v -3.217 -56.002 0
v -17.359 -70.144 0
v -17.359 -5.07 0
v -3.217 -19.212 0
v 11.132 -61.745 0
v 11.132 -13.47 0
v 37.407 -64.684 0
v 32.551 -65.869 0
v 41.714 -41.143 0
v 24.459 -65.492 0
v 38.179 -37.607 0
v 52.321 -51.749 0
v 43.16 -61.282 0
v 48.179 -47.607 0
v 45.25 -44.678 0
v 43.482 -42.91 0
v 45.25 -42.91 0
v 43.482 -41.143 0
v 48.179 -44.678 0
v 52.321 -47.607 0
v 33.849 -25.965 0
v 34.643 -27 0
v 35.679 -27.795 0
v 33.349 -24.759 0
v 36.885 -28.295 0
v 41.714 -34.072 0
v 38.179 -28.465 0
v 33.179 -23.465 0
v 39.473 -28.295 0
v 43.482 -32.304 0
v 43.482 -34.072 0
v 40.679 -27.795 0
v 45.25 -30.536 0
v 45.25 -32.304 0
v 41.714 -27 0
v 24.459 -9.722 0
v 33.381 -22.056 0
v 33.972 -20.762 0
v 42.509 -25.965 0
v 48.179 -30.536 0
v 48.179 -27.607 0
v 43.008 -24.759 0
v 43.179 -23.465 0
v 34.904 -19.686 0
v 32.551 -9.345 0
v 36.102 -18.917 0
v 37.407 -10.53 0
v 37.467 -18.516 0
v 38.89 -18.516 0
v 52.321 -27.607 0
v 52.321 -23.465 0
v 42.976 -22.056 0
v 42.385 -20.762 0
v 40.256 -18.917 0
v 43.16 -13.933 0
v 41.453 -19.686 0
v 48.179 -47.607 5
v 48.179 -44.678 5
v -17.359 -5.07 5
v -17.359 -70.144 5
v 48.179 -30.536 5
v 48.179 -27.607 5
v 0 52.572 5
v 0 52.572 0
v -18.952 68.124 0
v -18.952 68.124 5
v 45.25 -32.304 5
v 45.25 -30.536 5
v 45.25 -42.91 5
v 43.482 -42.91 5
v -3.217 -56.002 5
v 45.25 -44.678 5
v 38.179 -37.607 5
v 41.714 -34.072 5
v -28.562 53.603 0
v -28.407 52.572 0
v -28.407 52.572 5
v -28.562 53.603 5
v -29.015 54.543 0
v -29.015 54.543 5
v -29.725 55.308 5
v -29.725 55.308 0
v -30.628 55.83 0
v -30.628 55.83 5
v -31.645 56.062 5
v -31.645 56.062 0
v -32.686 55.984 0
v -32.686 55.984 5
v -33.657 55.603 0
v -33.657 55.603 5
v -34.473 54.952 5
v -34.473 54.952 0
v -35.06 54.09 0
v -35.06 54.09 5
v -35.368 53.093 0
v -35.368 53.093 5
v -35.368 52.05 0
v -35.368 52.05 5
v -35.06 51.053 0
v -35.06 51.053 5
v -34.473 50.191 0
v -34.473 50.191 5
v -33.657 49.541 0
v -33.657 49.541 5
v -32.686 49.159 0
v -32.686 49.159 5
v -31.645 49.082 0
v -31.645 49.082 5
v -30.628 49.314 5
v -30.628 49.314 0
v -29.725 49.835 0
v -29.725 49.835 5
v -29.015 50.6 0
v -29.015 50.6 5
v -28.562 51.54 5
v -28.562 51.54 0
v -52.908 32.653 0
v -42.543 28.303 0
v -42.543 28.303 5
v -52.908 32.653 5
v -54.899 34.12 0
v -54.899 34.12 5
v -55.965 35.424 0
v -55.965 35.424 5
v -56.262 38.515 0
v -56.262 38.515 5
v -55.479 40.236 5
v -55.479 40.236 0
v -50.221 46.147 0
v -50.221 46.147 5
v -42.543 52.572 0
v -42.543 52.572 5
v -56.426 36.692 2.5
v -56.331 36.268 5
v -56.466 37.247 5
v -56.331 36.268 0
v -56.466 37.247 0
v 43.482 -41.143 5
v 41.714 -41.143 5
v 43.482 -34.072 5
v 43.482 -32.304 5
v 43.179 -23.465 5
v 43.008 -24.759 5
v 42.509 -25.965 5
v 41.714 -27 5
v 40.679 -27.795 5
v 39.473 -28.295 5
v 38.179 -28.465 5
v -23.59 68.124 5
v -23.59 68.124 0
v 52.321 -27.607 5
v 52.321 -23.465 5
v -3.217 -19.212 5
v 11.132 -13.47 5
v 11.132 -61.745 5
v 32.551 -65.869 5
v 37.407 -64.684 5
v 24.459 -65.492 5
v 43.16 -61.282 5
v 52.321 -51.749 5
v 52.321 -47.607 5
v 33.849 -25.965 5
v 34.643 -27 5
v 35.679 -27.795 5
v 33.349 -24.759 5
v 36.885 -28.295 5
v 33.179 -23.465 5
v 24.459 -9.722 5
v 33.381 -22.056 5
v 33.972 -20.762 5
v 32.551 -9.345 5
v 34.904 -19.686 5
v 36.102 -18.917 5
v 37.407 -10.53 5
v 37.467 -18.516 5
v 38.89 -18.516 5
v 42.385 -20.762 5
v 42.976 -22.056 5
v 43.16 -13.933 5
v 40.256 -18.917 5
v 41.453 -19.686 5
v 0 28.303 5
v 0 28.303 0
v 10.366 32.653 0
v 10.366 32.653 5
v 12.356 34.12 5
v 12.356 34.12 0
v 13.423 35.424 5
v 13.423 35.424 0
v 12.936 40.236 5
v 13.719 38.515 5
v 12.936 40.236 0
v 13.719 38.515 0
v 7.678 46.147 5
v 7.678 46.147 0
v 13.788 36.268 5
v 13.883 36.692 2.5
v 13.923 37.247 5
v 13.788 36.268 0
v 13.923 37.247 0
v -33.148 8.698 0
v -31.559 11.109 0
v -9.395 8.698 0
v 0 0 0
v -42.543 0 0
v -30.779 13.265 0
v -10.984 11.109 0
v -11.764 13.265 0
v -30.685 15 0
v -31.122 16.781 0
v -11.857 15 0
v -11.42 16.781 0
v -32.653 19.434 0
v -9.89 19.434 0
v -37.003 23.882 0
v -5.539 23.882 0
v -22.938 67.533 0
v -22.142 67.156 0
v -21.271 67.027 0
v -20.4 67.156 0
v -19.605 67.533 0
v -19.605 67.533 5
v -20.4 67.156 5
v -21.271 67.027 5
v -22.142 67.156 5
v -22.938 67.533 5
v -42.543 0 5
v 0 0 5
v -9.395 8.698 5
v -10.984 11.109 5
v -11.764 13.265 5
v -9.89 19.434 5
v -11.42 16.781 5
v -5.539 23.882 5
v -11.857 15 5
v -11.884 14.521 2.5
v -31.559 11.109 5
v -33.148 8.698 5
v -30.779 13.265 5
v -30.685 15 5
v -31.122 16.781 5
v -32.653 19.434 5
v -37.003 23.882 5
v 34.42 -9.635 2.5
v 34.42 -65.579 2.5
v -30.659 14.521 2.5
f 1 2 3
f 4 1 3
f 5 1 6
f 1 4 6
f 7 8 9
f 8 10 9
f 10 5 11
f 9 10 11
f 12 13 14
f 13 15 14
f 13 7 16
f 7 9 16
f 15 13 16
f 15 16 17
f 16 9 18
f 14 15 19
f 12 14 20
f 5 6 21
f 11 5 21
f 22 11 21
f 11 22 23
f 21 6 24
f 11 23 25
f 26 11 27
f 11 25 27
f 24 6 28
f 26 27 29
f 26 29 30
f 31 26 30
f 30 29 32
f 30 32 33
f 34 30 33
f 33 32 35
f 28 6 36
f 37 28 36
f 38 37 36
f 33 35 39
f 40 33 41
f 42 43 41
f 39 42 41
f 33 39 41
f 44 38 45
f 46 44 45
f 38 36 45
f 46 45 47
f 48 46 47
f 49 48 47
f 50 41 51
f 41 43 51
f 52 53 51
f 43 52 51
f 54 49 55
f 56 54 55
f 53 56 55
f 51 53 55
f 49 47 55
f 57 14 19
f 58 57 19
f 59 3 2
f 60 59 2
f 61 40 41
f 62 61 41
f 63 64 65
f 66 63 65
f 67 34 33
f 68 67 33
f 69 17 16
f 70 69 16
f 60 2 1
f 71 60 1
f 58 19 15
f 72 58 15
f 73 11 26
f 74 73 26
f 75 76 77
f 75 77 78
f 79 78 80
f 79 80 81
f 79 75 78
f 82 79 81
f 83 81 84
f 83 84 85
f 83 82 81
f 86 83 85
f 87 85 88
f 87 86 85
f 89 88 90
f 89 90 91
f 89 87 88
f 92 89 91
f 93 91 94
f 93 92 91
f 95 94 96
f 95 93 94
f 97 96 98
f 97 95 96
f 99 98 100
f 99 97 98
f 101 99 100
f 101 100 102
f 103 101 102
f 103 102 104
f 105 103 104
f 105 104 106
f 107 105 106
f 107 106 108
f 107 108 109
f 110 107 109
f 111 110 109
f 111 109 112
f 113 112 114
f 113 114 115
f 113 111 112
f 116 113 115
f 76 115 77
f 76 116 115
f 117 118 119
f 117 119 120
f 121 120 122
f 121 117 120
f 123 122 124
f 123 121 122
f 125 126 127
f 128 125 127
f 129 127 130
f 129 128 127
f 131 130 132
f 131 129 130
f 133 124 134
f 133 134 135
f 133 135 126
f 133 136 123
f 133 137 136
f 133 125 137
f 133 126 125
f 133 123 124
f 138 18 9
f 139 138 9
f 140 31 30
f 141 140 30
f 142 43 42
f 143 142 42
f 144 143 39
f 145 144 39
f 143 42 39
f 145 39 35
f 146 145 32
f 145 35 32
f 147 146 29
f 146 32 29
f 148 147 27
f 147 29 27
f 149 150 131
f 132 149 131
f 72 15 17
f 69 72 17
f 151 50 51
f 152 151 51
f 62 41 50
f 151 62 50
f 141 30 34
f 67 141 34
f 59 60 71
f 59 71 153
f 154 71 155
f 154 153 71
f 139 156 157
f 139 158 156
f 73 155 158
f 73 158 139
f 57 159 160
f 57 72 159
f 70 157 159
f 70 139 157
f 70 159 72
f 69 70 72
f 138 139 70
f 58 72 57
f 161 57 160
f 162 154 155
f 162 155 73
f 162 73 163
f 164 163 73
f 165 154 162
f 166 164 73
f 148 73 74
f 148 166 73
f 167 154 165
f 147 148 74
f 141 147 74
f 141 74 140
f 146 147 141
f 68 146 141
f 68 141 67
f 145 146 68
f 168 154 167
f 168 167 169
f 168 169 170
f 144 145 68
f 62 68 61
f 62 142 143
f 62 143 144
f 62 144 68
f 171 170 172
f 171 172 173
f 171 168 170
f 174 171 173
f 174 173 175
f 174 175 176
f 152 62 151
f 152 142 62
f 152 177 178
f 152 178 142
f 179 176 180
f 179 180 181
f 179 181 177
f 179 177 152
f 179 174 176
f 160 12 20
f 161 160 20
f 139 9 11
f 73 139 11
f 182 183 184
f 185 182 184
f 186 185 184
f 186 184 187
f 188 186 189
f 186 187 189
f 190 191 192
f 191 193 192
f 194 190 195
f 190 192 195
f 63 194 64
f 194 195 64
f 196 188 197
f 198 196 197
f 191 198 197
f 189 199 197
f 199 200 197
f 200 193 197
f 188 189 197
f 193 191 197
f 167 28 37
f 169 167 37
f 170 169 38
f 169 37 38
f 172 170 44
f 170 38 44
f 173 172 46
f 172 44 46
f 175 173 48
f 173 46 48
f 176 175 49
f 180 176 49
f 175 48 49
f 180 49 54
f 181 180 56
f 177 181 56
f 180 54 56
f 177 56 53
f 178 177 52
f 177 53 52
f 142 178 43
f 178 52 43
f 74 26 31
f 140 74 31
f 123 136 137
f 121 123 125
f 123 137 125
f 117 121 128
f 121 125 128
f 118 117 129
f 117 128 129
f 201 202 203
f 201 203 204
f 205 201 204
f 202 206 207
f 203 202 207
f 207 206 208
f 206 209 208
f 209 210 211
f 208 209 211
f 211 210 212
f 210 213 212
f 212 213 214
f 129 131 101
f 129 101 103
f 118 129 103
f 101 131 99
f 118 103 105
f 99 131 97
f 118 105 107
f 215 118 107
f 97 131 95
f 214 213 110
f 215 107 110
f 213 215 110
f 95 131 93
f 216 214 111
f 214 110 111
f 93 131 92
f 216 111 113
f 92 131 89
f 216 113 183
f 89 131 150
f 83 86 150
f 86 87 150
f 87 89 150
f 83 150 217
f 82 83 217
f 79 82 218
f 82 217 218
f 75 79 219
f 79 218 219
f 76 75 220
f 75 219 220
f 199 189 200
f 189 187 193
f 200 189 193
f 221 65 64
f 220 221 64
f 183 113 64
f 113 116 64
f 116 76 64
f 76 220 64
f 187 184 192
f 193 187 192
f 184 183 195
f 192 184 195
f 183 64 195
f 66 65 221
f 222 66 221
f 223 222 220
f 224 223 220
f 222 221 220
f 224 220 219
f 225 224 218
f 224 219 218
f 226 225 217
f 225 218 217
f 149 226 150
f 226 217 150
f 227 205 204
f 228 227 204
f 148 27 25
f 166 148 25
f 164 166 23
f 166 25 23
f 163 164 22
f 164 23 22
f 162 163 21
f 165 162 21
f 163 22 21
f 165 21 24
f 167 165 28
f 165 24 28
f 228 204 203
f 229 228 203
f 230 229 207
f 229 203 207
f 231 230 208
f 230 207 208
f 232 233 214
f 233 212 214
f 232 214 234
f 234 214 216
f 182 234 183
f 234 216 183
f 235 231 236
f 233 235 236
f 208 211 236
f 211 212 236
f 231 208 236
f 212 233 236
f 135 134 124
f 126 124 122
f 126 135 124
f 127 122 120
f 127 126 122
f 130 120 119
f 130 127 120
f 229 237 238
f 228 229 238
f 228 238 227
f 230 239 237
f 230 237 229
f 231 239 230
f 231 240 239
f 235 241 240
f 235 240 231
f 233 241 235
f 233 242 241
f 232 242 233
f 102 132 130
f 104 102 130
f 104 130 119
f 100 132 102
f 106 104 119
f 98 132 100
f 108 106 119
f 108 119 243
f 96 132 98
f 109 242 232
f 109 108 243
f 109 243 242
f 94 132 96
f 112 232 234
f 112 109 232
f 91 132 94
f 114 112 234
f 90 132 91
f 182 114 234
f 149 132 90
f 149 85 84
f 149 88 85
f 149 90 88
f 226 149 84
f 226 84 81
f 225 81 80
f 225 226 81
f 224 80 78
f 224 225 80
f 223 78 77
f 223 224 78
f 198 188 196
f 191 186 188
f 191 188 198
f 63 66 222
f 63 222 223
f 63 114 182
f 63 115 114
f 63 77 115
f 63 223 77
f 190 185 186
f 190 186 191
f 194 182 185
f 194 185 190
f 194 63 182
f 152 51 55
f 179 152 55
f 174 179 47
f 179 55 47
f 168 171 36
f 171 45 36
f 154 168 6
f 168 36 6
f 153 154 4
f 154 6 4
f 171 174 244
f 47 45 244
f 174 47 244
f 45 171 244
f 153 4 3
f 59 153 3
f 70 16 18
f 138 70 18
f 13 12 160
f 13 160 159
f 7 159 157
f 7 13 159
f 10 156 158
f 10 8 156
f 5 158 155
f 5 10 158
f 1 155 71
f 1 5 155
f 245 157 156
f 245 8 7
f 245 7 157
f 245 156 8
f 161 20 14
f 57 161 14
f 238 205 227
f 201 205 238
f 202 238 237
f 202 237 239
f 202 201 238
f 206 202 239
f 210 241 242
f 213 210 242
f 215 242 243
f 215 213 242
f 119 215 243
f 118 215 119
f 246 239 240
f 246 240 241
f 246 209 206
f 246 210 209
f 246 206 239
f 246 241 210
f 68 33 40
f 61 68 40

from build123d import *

# Parameters (mm, degrees)
F0_R     = 3.5
F1_DEPTH = 5
F3_DEPTH = 5


with BuildPart() as f1:
    # F0 (on Top) → F1 (new body)
    with BuildSketch(Plane.XY):
        with BuildLine():
            Line((-42.5426512957, 0), (0, 0))
            add(Edge.make_bspline(
                [(0, 0), (-5.9723485636, 4.8846561298), (-17.8262648049, 14.5797181406), (-5.9116725738, 23.7522278051), (0, 28.3033587039)],
                knots=[0, 0, 0, 0, 0.503829164, 1, 1, 1, 1], degree=3))
            add(Edge.make_bspline(
                [(0, 28.3033587039), (6.6567072616, 30.6686100806), (20.9042106237, 35.7310122396), (7.2661112302, 46.7180524748), (0, 52.5717362761)],
                knots=[0, 0, 0, 0, 0.467219258, 1, 1, 1, 1], degree=3))
            Line((0, 52.5717362761), (-18.9522210256, 68.1242011959))
            ThreePointArc((-18.9522210256, 68.1242011959), (-21.2713256478, 67.0272917747), (-23.59043027, 68.1242011959))
            Line((-23.59043027, 68.1242011959), (-42.5426512957, 52.5717362761))
            add(Edge.make_bspline(
                [(-42.5426512957, 28.3033587039), (-49.1993585573, 30.6686100806), (-63.4468619193, 35.7310122396), (-49.8087625258, 46.7180524748), (-42.5426512957, 52.5717362761)],
                knots=[0, 0, 0, 0, 0.467219258, 1, 1, 1, 1], degree=3))
            add(Edge.make_bspline(
                [(-42.5426512957, 0), (-36.5703027321, 4.8846561298), (-24.7163864907, 14.5797181406), (-36.6309787218, 23.7522278051), (-42.5426512957, 28.3033587039)],
                knots=[0, 0, 0, 0, 0.503829164, 1, 1, 1, 1], degree=3))
        make_face()
        with Locations((-31.9069884717, 52.5717362761)):
            Circle(F0_R, mode=Mode.SUBTRACT)
    extrude(amount=F1_DEPTH)


with BuildPart() as f3:
    # F2 (on Top) → F3 (new body)
    with BuildSketch(Plane.XY):
        Polygon((52.3208206332, -27.6070432306), (52.3208206332, -23.4649076069), (48.1786850095, -27.6070432306), align=None)
        Polygon((48.1786850095, -27.6070432306), (45.2497528213, -30.5359754188), (48.1786850095, -30.5359754188), align=None)
        Polygon((45.2497528213, -30.5359754188), (43.4819858684, -32.3037423717), (45.2497528213, -32.3037423717), align=None)
        Polygon((43.4819858684, -32.3037423717), (41.7142189154, -34.0715093247), (43.4819858684, -34.0715093247), align=None)
        Polygon((45.2497528213, -42.9103440895), (43.4819858684, -42.9103440895), (45.2497528213, -44.6781110425), align=None)
        Polygon((48.1786850095, -44.6781110425), (45.2497528213, -44.6781110425), (48.1786850095, -47.6070432306), align=None)
        Polygon((52.3208206332, -47.6070432306), (48.1786850095, -47.6070432306), (52.3208206332, -51.7491788544), align=None)
        Polygon((43.4819858684, -41.1425771366), (41.7142189154, -41.1425771366), (43.4819858684, -42.9103440895), align=None)
        with BuildLine():
            Line((38.1786850095, -28.4649076069), (38.1786850095, -37.6070432306))
            Line((38.1786850095, -37.6070432306), (41.7142189154, -34.0715093247))
            Line((41.7142189154, -34.0715093247), (43.4819858684, -32.3037423717))
            Line((43.4819858684, -32.3037423717), (45.2497528213, -30.5359754188))
            Line((45.2497528213, -30.5359754188), (48.1786850095, -27.6070432306))
            Line((48.1786850095, -27.6070432306), (52.3208206332, -23.4649076069))
            Line((52.3208206332, -23.4649076069), (43.1786850095, -23.4649076069))
            ThreePointArc((43.1786850095, -23.4649076069), (41.7142189154, -27.0004415128), (38.1786850095, -28.4649076069))
        make_face()
        with BuildLine():
            Line((41.7142189154, -41.1425771366), (38.1786850095, -37.6070432306))
            Line((38.1786850095, -37.6070432306), (38.1786850095, -28.4649076069))
            ThreePointArc((38.1786850095, -28.4649076069), (34.6431511035, -27.0004415128), (33.1786850095, -23.4649076069))
            ThreePointArc((33.1786850095, -23.4649076069), (38.1786850095, -18.4649076069), (43.1786850095, -23.4649076069))
            Line((43.1786850095, -23.4649076069), (52.3208206332, -23.4649076069))
            add(Edge.make_bspline(
                [(52.3208206332, -23.4649076069), (47.1346856365, -17.3300638089), (35.1532147018, -3.1568037235), (10.6690169358, -13.4018273342), (-3.217285499, -19.2123241723)],
                knots=[0, 0, 0, 0, 0.4328464418, 1, 1, 1, 1], degree=3))
            Line((-3.217285499, -19.2123241723), (-17.3594211227, -5.0701885485))
            Line((-17.3594211227, -5.0701885485), (-17.3594211227, -70.1438979128))
            Line((-17.3594211227, -70.1438979128), (-3.217285499, -56.001762289))
            add(Edge.make_bspline(
                [(52.3208206332, -51.7491788544), (47.1346856365, -57.8840226524), (35.1532147018, -72.0572827378), (10.6690169358, -61.8122591271), (-3.217285499, -56.001762289)],
                knots=[0, 0, 0, 0, 0.4328464418, 1, 1, 1, 1], degree=3))
            Line((52.3208206332, -51.7491788544), (48.1786850095, -47.6070432306))
            Line((48.1786850095, -47.6070432306), (45.2497528213, -44.6781110425))
            Line((45.2497528213, -44.6781110425), (43.4819858684, -42.9103440895))
            Line((43.4819858684, -42.9103440895), (41.7142189154, -41.1425771366))
        make_face()
    extrude(amount=F3_DEPTH)


solid = Compound([f1.part, f3.part])
